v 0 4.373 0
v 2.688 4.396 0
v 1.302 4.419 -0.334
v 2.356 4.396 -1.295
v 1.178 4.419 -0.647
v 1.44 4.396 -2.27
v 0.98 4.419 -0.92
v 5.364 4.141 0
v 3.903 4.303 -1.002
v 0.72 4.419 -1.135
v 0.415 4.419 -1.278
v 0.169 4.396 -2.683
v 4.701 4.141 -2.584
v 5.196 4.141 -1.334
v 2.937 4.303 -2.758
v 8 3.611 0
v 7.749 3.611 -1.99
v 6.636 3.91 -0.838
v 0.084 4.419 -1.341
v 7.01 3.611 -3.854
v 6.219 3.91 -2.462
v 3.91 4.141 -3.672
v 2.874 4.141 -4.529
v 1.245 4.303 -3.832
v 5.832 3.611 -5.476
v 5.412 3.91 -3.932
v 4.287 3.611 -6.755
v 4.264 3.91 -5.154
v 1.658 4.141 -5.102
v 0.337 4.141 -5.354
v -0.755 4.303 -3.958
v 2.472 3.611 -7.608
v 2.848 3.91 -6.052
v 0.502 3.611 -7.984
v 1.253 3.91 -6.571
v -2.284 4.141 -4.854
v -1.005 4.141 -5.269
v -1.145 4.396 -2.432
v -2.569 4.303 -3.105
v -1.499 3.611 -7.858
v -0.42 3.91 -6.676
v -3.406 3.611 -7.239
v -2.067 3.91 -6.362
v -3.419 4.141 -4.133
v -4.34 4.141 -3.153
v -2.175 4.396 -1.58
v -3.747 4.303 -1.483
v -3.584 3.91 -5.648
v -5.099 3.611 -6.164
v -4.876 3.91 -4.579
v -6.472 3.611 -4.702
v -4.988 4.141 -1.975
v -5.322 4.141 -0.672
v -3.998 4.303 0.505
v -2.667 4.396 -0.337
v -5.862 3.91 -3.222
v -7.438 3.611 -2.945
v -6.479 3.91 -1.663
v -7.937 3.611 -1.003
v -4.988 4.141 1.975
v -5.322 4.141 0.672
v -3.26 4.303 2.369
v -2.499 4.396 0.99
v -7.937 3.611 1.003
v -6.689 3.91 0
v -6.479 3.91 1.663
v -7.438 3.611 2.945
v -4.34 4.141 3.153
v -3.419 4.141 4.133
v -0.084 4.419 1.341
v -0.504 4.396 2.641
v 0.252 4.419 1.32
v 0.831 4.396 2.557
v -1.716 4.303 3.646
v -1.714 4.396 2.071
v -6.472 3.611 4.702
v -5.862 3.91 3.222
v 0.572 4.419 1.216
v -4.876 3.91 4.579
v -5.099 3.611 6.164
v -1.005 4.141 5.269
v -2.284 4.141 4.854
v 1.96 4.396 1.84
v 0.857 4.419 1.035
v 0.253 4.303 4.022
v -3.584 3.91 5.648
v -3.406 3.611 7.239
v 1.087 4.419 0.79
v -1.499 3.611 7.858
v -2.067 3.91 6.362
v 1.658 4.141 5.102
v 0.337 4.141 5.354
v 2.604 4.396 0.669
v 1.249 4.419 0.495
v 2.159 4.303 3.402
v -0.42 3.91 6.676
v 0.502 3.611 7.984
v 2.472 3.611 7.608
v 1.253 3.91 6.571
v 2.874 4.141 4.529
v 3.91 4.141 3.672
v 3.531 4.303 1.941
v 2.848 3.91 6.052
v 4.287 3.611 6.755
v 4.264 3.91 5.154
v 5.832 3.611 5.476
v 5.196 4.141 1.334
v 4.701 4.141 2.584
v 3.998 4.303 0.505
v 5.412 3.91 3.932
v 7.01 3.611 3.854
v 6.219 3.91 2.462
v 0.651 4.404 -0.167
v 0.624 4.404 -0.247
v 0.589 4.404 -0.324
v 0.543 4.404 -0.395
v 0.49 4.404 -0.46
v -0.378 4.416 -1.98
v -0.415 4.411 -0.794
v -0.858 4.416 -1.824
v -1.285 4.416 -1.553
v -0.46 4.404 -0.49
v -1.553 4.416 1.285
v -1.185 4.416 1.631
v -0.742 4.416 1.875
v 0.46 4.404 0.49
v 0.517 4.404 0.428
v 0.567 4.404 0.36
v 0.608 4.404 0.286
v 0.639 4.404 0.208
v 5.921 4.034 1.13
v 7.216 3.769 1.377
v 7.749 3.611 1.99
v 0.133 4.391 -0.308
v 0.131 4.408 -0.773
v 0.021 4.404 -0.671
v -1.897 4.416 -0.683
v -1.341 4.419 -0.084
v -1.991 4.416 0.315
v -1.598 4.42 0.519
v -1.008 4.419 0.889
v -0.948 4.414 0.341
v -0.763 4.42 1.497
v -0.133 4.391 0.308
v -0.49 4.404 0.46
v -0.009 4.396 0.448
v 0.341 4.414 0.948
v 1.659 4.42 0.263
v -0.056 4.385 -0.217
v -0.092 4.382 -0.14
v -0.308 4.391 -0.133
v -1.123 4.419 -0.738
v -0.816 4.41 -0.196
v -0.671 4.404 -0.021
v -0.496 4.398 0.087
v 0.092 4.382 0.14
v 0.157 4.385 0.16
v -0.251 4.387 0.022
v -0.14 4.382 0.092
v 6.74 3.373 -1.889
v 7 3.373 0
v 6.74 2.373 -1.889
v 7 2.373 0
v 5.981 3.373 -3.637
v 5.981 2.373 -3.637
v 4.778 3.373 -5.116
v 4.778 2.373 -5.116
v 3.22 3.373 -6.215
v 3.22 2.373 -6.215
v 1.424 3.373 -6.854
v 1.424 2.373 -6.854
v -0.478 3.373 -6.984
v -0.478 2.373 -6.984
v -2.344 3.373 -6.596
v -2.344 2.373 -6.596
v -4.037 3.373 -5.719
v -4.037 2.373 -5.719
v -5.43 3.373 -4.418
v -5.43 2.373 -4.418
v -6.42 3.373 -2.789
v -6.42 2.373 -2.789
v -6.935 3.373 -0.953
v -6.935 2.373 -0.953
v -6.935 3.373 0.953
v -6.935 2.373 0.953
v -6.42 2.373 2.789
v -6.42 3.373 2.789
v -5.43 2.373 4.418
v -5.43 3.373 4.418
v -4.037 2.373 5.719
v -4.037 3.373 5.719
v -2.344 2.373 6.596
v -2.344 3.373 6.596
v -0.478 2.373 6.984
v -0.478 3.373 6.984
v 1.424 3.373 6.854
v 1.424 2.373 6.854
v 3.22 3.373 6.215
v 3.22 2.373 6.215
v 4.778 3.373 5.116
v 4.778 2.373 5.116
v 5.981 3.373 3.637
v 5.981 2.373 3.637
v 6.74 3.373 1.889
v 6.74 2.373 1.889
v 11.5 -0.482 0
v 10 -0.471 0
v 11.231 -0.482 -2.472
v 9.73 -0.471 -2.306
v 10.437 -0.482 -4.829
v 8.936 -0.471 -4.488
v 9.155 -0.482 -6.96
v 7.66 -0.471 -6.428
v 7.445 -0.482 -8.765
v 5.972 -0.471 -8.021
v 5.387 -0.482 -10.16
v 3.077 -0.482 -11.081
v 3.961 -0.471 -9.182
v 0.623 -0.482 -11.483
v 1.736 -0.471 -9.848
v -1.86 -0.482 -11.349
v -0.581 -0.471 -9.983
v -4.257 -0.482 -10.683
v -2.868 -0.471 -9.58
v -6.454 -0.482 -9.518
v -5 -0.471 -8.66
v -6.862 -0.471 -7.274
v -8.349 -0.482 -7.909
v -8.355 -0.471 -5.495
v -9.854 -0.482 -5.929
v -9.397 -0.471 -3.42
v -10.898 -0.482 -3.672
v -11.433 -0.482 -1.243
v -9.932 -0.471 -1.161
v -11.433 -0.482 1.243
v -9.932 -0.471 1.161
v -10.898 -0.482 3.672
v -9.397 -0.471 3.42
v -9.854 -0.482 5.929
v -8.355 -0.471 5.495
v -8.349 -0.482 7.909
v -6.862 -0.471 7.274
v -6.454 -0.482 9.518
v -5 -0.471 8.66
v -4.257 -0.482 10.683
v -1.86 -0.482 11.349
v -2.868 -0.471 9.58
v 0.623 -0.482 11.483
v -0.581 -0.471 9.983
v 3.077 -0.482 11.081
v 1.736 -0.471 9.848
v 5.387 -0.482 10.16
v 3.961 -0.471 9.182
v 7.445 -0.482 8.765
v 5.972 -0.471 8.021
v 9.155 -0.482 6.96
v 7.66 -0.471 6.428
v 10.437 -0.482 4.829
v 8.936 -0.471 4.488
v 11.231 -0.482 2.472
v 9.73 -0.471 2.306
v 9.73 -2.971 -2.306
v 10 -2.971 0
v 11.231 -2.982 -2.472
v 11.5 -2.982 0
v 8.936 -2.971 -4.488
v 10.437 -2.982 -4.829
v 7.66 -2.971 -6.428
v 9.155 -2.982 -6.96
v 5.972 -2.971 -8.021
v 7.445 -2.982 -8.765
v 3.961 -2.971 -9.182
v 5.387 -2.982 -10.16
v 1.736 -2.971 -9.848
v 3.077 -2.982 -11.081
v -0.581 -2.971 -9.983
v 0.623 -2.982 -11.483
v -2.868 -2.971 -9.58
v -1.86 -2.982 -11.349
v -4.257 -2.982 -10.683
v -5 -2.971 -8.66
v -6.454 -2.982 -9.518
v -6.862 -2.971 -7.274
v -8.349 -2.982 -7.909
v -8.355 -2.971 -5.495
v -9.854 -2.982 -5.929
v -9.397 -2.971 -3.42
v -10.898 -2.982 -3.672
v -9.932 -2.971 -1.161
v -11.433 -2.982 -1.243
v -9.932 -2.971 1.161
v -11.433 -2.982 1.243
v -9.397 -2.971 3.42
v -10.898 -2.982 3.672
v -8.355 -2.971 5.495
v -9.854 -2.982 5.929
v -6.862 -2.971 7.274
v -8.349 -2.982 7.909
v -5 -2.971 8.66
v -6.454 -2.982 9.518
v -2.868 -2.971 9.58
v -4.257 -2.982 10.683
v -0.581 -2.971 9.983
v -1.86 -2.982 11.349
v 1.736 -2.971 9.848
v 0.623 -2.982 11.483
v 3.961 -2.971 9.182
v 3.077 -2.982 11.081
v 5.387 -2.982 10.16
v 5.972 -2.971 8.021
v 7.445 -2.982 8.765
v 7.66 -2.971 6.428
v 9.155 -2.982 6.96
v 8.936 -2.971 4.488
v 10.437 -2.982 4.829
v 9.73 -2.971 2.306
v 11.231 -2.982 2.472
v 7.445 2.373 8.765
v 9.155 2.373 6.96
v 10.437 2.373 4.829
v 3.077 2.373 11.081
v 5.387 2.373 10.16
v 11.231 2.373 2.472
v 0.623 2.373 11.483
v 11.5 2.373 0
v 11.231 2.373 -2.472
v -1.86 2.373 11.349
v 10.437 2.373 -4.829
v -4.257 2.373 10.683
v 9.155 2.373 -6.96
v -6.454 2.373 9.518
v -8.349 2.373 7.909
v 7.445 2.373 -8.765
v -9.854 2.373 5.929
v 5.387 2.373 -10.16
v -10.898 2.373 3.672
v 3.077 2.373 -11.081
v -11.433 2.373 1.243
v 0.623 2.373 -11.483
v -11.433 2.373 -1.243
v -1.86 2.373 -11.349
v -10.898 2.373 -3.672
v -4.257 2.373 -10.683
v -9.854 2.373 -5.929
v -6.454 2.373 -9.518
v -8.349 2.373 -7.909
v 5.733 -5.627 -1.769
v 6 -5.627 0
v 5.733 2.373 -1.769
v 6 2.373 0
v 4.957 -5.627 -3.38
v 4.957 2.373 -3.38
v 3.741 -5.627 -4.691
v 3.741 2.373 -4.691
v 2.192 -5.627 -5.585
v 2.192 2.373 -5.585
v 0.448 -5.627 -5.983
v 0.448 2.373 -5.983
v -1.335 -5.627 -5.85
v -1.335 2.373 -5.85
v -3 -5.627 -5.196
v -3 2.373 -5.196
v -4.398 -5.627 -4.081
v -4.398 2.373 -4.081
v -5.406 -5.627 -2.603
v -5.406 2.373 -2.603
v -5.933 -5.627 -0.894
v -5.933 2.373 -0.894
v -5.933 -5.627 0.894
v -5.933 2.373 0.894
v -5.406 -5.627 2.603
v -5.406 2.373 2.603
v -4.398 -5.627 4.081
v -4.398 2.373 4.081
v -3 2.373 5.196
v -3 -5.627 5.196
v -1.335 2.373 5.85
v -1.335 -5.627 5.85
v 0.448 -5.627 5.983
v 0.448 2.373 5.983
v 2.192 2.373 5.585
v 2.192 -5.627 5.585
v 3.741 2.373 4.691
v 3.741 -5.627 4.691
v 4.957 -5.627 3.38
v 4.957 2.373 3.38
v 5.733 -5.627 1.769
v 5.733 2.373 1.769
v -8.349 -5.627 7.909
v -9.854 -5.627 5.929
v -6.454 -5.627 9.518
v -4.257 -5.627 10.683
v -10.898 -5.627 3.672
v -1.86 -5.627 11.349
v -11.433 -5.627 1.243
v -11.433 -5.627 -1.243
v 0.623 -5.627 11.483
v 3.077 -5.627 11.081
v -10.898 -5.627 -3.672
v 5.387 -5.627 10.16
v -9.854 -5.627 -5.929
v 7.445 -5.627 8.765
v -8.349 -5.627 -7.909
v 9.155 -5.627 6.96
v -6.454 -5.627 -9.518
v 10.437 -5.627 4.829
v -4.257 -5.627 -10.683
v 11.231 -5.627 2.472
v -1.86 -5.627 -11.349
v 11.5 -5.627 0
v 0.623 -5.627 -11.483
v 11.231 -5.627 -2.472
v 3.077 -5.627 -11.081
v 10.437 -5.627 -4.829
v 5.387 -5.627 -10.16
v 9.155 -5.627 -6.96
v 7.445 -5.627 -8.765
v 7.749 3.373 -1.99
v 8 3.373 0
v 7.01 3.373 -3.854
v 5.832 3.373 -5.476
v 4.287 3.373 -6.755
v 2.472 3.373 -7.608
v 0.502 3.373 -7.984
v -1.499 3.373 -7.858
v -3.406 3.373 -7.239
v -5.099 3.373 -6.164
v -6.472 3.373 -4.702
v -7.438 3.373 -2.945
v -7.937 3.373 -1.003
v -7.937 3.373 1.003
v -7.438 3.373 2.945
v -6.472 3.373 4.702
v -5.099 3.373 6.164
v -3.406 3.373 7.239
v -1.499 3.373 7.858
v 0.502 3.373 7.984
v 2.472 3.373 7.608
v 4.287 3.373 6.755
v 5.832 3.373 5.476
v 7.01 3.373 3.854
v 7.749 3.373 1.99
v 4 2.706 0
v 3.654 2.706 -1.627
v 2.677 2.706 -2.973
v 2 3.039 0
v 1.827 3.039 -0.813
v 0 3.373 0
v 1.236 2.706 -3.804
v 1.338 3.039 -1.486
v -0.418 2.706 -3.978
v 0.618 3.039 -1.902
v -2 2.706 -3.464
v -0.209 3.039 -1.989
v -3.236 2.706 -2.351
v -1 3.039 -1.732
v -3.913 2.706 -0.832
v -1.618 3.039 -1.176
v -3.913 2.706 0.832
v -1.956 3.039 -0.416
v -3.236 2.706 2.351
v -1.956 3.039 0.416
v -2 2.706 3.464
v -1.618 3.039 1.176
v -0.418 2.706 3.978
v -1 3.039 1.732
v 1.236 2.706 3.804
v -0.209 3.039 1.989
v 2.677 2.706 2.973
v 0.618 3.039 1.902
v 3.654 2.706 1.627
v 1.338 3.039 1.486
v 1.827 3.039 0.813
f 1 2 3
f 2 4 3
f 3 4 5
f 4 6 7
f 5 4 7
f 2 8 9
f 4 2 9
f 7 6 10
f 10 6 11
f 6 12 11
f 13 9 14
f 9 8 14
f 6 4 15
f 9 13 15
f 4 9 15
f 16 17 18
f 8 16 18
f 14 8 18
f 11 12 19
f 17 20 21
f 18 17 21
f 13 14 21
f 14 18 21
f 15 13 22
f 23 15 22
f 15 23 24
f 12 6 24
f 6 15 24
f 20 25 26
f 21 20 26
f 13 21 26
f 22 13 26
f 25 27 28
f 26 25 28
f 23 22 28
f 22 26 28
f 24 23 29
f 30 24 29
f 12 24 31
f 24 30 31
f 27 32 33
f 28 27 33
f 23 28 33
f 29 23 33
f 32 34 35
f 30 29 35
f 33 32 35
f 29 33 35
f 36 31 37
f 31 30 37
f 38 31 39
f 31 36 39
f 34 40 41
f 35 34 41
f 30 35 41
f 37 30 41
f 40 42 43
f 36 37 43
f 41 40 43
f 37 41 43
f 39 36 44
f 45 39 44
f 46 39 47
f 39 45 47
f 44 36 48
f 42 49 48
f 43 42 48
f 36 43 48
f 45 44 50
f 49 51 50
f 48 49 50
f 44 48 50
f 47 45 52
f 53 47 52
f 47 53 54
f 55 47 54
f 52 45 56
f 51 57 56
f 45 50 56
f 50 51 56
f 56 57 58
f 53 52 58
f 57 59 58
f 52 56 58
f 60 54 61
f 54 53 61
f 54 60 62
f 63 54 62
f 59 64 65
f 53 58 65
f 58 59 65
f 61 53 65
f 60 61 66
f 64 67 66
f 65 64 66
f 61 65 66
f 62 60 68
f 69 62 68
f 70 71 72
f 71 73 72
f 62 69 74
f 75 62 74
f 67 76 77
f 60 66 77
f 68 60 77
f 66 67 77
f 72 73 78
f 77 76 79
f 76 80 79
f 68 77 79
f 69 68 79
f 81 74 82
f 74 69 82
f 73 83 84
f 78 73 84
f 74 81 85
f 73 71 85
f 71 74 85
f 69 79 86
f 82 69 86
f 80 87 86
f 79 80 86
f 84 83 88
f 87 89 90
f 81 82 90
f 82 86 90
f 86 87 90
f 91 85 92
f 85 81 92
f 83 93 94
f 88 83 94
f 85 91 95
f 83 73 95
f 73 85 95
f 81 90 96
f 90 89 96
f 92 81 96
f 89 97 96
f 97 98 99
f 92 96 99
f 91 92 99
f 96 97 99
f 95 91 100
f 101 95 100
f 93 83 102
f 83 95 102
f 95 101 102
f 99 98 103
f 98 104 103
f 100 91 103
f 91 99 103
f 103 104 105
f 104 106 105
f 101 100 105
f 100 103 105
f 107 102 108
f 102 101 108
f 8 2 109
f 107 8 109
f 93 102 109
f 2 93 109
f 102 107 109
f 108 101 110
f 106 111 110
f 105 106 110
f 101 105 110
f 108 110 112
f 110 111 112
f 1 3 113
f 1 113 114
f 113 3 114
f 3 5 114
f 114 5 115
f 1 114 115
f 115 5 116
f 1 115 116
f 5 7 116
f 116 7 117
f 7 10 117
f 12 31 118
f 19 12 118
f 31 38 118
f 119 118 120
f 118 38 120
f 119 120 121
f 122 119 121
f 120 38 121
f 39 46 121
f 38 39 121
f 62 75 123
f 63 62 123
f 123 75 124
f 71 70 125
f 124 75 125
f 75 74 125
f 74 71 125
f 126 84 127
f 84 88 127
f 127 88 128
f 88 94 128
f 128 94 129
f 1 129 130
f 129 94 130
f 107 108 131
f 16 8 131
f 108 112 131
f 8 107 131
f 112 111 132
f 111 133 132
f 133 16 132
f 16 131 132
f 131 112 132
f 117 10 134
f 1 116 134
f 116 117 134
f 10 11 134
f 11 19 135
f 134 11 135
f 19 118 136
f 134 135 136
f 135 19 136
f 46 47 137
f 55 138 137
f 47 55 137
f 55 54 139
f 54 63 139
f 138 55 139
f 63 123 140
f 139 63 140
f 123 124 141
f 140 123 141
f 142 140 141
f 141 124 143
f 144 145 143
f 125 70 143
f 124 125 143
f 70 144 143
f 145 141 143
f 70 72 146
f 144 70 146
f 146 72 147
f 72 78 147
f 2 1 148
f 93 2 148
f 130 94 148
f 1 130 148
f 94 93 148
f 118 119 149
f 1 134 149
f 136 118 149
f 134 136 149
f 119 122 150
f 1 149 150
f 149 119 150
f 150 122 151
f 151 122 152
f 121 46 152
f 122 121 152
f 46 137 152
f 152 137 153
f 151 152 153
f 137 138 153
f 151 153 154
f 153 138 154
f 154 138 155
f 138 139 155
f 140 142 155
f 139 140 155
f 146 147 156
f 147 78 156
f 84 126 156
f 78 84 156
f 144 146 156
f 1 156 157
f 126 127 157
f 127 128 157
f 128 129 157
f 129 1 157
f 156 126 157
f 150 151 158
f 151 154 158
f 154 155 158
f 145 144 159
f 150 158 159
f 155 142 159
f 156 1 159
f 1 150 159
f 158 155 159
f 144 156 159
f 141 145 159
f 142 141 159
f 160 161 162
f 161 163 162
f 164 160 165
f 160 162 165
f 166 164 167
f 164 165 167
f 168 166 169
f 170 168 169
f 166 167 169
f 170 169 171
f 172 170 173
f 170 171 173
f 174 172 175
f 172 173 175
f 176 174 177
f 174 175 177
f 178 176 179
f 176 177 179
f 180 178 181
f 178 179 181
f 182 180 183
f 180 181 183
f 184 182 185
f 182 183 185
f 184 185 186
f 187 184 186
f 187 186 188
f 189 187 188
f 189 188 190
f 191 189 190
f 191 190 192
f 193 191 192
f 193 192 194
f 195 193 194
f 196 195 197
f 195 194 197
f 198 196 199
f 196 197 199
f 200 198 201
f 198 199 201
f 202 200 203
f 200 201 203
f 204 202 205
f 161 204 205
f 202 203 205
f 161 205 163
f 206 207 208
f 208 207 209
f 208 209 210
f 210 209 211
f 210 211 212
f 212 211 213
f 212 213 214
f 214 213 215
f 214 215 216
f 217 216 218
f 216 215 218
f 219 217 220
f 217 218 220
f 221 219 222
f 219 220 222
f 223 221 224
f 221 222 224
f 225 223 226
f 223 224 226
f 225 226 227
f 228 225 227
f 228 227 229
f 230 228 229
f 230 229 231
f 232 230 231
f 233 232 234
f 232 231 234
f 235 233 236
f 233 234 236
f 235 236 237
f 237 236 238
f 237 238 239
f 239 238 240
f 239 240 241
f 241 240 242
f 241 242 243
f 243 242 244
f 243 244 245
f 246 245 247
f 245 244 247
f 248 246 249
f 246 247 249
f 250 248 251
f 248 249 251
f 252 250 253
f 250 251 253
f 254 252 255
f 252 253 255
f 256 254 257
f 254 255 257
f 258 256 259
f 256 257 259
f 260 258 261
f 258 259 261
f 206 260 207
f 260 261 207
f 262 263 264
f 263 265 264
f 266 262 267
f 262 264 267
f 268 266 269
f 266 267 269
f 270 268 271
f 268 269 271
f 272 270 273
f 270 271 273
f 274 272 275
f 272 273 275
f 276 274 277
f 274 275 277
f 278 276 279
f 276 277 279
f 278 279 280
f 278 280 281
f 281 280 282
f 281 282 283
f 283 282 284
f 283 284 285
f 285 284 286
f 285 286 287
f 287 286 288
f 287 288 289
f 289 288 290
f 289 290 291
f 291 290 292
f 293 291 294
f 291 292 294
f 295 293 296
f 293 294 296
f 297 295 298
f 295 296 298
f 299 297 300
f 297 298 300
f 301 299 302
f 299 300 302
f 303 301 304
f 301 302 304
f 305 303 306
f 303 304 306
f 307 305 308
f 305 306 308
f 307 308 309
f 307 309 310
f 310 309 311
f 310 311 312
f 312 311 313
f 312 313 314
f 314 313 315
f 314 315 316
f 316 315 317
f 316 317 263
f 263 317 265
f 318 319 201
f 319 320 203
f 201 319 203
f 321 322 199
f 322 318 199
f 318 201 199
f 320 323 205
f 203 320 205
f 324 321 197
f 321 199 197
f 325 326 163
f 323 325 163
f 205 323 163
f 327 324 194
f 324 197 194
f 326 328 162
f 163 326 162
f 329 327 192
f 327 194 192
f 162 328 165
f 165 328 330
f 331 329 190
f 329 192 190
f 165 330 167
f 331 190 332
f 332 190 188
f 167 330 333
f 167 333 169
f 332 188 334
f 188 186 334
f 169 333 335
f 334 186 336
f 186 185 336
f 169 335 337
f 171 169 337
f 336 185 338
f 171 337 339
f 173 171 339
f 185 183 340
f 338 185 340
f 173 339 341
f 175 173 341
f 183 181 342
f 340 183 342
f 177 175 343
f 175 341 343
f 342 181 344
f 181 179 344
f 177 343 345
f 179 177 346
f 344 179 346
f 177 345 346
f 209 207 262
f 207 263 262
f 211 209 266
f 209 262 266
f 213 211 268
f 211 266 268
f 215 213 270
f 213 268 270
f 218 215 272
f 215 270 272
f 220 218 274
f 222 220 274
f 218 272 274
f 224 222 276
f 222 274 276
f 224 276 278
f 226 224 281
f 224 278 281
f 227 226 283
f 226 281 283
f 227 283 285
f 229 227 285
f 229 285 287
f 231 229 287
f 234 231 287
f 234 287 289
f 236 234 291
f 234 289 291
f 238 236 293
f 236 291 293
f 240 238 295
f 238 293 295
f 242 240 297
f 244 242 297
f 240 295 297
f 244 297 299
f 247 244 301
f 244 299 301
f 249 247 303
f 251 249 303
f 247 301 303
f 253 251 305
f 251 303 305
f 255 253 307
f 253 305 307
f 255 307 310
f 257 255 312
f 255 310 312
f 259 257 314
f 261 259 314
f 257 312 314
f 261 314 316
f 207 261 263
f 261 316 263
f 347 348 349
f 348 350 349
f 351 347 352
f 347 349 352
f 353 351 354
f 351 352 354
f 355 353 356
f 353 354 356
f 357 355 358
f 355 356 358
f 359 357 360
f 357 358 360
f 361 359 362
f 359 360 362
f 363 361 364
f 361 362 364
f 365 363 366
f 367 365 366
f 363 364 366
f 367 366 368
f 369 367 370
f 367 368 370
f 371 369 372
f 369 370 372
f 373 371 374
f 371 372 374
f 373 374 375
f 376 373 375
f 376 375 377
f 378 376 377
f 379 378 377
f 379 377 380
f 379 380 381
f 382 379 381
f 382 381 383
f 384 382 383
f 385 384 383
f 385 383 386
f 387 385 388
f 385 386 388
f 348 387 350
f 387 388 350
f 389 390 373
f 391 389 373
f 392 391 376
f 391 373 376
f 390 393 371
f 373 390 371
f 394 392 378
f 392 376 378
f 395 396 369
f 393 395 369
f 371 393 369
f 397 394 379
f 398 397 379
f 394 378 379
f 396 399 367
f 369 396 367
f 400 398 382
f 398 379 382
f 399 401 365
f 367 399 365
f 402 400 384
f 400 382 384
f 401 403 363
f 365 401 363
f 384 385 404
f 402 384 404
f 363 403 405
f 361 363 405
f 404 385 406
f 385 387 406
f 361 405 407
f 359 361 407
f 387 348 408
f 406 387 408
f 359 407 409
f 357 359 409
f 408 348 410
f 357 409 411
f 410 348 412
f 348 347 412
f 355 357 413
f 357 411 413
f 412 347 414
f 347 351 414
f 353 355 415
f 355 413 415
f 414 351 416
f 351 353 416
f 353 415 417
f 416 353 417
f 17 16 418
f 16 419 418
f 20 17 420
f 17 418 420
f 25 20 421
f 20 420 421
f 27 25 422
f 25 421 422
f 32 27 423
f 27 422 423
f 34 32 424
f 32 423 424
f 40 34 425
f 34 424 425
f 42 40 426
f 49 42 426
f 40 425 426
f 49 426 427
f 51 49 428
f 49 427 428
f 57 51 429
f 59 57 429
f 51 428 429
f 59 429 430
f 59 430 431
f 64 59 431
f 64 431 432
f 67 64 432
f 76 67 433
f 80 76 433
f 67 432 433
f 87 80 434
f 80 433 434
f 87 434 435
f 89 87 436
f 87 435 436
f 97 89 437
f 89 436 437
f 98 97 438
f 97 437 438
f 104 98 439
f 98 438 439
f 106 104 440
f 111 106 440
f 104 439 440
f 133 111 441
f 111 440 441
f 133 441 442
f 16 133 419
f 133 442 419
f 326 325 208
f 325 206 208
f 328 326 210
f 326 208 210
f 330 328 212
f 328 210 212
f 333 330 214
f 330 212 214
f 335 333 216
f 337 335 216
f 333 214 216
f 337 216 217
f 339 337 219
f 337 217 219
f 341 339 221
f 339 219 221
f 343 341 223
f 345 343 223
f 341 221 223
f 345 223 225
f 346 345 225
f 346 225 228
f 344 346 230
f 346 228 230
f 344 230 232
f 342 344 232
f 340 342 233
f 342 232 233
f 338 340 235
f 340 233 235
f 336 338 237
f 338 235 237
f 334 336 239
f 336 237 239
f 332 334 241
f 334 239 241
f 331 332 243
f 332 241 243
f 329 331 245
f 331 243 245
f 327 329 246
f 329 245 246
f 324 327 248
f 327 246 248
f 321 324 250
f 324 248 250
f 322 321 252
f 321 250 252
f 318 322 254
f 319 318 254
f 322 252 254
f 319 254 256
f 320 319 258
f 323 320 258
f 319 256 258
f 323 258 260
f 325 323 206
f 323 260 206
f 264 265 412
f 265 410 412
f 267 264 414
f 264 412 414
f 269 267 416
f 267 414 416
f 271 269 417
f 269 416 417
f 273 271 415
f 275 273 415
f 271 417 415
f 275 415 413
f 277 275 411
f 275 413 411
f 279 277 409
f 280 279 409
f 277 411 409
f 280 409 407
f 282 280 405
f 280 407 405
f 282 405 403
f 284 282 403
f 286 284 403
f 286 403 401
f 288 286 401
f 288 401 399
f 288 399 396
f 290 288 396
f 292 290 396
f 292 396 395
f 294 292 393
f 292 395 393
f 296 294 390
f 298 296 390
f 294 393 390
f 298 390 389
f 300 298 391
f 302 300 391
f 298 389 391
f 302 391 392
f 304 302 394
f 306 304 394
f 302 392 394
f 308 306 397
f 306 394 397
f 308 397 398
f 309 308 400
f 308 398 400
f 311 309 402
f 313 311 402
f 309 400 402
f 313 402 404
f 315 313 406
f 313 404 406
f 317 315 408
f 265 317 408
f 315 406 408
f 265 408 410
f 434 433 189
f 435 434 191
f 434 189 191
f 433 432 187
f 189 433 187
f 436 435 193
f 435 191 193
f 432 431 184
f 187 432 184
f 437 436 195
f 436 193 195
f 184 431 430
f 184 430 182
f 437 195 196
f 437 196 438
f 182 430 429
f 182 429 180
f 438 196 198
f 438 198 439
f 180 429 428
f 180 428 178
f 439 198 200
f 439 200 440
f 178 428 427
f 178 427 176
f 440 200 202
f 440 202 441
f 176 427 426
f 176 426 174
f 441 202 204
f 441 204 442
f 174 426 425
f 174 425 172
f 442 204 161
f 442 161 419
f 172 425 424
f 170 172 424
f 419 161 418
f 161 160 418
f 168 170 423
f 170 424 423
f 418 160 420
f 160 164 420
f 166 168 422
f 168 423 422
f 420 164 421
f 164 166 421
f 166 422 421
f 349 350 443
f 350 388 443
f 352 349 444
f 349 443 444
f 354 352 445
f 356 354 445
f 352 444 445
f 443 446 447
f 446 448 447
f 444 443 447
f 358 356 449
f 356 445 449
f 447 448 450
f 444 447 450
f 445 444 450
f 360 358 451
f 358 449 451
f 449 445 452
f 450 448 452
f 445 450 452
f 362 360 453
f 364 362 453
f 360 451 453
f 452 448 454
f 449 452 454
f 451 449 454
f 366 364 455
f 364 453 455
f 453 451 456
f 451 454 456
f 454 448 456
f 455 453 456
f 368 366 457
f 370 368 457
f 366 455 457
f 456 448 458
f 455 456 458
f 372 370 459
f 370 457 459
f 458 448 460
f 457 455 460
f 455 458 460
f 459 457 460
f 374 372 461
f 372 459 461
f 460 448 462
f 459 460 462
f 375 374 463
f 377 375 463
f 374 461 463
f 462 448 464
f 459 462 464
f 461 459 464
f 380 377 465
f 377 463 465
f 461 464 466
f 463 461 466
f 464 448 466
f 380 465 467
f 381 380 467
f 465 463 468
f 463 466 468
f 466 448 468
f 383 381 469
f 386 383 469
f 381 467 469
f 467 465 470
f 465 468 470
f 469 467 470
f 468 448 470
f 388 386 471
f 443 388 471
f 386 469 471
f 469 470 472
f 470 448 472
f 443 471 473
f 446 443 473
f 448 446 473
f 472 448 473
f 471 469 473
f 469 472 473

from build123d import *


with BuildPart() as part:
    # Эскиз1 → Повернуть1 (revolve)
    with BuildSketch(Plane.XY):
        with BuildLine():
            Line((11.5, -2.982243983), (11.5, -5.627433044))
            Line((11.5, -5.627433044), (6, -5.627433044))
            Line((6, -5.627433044), (6, 2.372566956))
            Line((6, 2.372566956), (0, 3.372566956))
            Line((0, 3.372566956), (0, 4.372566956))
            ThreePointArc((0, 4.372566956), (4.029595345, 4.302809639), (8, 3.611151047))
            Line((8, 3.611151047), (8, 3.372566956))
            Line((8, 3.372566956), (7, 3.372566956))
            Line((7, 3.372566956), (7, 2.372566956))
            Line((7, 2.372566956), (11.5, 2.372566956))
            Line((11.5, 2.372566956), (11.5, -0.481527002))
            Line((11.5, -0.481527002), (10, -0.470528934))
            Line((10, -0.470528934), (10, -2.971245915))
            Line((10, -2.971245915), (11.5, -2.982243983))
        make_face()
    revolve(axis=Axis((0, 3.372566956, 0), (0, 1, 0)))


solid = part.part
